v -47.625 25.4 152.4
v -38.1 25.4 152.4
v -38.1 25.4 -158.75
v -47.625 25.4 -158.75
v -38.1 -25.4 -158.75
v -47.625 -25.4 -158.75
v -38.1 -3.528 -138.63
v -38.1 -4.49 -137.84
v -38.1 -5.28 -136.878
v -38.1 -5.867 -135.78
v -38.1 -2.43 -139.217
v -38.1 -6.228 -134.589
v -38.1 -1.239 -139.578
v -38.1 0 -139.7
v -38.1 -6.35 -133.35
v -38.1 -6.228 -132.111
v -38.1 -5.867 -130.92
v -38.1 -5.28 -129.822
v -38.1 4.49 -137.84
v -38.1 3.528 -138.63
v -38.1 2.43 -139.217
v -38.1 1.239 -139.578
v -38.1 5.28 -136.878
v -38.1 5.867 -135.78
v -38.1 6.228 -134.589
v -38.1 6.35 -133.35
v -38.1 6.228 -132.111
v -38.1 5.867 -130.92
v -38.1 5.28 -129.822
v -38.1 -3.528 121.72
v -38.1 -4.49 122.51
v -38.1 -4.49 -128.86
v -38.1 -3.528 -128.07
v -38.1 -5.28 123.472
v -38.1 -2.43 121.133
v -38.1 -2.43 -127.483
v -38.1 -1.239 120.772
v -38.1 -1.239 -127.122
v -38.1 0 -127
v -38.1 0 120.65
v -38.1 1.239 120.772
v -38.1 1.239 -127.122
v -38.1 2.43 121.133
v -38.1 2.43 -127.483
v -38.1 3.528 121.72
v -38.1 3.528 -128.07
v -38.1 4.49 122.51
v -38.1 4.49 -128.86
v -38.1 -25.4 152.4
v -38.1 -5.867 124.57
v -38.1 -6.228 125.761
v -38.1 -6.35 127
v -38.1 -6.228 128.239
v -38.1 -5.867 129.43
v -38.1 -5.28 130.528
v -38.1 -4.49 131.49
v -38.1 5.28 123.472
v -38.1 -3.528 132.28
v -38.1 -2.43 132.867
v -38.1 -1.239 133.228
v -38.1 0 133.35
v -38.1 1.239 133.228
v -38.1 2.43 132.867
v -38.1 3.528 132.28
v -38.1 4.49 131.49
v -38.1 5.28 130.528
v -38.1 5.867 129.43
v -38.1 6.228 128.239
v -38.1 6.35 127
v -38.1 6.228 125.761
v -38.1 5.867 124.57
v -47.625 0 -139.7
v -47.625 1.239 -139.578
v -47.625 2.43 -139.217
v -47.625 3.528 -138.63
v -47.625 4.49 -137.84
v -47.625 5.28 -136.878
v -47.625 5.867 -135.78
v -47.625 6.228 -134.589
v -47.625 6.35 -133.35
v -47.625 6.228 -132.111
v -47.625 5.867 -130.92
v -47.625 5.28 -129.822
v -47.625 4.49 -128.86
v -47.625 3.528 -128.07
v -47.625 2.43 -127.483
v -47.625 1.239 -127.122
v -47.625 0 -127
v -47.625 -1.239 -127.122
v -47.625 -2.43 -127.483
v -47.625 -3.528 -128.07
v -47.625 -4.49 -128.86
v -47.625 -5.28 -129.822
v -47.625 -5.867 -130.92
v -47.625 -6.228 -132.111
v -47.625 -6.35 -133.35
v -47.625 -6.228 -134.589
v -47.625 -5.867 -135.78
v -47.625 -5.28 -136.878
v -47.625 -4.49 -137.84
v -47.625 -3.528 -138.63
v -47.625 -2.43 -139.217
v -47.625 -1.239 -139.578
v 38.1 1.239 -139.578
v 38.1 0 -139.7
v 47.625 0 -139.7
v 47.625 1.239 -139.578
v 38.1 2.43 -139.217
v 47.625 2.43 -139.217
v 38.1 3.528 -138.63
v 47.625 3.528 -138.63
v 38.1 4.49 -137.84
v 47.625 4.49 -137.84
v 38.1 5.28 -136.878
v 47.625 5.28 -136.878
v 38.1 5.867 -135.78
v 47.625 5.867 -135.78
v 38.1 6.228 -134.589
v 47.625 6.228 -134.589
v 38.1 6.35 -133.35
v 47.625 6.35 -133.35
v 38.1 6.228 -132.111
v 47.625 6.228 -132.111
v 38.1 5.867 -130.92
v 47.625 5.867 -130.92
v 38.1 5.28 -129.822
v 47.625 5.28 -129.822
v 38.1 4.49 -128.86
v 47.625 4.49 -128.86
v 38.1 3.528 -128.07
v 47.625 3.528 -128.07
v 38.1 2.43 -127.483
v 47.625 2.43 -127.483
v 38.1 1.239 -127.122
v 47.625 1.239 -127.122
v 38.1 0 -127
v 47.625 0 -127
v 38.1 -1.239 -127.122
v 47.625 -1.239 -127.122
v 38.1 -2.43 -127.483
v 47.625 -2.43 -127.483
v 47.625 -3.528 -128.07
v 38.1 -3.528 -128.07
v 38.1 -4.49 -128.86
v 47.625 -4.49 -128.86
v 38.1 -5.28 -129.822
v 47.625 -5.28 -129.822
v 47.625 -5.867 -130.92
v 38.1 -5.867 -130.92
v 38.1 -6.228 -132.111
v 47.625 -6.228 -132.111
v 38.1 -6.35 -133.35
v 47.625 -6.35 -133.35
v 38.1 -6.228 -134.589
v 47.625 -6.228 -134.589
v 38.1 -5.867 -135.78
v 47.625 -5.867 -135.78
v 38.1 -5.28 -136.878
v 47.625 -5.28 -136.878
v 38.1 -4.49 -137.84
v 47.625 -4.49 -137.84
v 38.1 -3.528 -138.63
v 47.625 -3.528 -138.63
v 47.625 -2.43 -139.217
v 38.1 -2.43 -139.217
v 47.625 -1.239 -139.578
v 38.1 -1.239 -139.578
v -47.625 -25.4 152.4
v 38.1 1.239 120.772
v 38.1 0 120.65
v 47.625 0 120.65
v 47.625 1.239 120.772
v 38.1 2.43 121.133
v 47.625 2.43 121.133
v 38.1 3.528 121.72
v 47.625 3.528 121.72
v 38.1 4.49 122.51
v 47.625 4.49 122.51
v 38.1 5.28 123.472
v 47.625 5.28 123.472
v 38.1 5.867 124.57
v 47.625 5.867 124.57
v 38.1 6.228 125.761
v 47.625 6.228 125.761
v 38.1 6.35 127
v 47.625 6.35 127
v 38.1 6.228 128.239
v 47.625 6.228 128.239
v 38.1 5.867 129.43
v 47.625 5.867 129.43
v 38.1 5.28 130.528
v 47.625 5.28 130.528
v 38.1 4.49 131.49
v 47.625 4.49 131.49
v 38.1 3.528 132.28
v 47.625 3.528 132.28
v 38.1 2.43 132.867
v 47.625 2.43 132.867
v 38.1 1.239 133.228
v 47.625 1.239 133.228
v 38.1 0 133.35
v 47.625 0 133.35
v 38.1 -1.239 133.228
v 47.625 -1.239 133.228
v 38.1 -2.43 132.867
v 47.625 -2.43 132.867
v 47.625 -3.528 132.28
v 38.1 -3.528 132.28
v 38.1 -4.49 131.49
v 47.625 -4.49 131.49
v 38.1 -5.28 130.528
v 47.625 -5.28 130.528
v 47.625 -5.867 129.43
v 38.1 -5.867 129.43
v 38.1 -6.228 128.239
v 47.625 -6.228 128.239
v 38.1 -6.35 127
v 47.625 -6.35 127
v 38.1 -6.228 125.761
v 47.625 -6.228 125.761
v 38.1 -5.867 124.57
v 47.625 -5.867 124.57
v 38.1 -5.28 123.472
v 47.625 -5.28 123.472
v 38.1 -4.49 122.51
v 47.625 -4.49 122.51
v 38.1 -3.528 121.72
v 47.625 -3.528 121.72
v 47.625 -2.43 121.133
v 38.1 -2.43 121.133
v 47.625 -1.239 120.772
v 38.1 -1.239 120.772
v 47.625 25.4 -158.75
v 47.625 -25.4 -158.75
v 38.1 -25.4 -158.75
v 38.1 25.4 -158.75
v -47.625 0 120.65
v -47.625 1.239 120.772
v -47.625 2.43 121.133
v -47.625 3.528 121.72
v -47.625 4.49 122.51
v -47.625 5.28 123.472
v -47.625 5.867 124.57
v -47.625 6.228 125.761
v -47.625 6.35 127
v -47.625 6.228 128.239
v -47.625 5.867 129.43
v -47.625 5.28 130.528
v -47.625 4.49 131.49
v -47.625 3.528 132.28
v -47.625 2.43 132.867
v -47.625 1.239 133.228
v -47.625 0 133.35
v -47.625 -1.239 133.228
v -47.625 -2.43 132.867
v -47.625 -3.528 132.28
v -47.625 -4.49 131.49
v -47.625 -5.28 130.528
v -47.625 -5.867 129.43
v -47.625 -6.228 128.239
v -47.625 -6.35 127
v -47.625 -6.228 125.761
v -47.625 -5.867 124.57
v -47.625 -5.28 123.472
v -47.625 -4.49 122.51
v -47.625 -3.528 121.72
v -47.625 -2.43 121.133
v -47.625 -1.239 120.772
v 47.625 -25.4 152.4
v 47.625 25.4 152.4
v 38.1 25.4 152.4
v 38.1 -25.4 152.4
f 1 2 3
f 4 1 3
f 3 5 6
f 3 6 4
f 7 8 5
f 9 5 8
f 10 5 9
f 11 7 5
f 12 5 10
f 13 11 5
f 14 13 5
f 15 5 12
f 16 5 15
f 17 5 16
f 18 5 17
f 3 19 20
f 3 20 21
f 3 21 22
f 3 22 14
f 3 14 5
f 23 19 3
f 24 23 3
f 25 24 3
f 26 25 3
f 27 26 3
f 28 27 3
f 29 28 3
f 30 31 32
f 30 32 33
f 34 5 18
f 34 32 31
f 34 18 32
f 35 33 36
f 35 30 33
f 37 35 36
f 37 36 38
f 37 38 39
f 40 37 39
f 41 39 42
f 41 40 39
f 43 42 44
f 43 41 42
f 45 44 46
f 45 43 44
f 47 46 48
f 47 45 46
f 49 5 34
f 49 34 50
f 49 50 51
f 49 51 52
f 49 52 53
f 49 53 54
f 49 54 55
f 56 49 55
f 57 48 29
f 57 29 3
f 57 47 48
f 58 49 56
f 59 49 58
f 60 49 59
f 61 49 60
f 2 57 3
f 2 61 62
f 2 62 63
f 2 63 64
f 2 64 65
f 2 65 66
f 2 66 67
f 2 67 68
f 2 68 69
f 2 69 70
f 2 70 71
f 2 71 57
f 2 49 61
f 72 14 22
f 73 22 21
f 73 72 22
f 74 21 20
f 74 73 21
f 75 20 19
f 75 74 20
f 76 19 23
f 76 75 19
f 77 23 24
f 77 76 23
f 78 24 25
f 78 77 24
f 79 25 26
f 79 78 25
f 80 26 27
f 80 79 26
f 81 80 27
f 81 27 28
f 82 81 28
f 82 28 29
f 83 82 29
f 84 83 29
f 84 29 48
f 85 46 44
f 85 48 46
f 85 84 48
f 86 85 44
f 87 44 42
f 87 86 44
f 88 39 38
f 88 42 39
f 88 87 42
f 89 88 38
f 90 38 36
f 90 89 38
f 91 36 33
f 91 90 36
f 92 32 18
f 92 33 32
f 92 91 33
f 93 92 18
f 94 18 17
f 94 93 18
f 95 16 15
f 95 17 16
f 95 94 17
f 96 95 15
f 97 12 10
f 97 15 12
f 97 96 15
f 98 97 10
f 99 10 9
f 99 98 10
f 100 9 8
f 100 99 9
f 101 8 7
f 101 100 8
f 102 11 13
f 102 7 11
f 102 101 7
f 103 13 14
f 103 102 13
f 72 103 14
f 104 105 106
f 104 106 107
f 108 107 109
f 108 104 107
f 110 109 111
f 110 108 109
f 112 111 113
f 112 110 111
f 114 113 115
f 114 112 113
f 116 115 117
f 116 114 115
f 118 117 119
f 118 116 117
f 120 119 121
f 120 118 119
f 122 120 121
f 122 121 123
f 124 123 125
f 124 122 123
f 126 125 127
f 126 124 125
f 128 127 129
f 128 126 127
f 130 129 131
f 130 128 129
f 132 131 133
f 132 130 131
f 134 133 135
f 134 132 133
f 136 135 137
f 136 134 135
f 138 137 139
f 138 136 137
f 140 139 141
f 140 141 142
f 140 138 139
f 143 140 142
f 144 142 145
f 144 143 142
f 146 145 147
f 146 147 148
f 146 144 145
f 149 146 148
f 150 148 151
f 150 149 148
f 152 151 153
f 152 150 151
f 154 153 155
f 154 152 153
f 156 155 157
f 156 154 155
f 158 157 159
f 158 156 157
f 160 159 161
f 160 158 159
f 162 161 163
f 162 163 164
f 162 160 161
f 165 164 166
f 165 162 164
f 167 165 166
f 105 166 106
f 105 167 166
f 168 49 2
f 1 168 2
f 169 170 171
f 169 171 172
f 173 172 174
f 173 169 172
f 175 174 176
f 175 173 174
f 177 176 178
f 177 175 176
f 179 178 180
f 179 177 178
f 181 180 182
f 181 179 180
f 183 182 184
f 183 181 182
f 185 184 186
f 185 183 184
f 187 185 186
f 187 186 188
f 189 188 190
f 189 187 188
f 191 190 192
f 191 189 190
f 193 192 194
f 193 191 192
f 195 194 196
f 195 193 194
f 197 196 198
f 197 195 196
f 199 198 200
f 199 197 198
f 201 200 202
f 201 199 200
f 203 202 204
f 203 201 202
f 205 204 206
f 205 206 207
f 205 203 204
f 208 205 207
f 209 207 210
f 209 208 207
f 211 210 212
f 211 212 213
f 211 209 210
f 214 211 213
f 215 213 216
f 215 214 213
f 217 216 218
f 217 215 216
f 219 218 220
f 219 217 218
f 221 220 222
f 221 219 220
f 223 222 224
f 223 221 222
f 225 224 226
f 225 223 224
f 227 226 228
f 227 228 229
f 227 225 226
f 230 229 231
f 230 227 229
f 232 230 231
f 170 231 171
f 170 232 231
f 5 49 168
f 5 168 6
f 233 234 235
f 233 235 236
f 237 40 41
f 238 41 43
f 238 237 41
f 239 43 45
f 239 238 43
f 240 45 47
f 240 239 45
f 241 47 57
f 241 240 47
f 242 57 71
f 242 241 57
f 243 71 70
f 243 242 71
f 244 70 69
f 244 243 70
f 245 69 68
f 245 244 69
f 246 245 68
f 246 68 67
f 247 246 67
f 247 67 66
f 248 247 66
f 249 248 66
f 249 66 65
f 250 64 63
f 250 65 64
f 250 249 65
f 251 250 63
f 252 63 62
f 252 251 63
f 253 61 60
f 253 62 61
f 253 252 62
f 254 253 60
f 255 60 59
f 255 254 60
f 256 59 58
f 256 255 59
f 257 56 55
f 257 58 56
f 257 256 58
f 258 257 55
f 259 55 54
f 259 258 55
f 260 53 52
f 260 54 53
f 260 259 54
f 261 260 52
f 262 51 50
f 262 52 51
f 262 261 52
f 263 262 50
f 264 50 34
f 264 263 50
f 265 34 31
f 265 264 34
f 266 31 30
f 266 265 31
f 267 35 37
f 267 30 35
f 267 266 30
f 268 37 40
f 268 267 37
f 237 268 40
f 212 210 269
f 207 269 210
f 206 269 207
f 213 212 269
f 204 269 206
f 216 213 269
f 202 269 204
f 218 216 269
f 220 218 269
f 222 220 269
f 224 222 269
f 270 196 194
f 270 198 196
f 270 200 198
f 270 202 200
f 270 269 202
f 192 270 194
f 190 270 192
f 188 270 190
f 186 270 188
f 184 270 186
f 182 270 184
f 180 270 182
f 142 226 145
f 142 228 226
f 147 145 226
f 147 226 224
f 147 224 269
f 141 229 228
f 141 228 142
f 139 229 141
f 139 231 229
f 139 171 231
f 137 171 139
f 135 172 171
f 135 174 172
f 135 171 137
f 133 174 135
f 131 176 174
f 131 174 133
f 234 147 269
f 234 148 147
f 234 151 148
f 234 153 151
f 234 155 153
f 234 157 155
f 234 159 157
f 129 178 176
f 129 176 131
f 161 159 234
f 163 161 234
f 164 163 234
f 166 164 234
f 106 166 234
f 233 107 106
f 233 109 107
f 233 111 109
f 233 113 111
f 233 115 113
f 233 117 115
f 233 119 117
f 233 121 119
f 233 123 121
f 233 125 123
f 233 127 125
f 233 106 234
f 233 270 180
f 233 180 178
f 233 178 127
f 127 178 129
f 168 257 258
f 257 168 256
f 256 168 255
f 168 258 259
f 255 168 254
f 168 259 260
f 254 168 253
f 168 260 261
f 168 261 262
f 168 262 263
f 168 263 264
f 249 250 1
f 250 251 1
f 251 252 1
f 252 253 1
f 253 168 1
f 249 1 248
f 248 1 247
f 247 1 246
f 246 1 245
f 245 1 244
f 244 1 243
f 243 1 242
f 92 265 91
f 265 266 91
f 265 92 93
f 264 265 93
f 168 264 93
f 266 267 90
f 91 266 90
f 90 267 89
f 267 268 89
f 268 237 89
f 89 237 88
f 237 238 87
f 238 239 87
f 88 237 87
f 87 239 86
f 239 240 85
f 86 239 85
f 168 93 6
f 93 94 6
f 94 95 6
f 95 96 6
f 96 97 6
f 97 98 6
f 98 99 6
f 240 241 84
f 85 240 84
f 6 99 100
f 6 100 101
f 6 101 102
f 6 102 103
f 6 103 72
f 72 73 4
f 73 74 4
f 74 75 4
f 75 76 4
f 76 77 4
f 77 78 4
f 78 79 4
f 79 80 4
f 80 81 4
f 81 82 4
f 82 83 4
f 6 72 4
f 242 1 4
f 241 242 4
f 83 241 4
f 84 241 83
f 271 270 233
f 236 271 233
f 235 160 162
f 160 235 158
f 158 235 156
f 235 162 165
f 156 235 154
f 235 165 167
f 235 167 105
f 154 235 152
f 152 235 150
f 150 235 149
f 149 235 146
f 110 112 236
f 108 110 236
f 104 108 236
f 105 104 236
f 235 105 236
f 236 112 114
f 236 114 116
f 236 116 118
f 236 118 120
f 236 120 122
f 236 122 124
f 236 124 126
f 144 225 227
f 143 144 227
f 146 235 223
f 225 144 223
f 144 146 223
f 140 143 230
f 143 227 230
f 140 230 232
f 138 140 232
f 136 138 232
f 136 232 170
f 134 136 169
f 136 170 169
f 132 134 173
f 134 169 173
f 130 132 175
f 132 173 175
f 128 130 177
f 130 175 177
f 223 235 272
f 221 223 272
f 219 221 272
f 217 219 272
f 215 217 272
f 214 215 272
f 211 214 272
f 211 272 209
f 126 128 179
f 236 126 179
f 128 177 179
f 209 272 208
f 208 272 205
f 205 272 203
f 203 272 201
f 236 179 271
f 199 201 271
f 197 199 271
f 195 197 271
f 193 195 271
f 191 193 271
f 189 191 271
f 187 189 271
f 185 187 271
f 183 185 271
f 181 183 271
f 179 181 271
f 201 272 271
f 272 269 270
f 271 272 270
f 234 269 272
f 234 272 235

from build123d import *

# Parameters (mm, degrees)
SKETCH1_W           = 311.15
SKETCH1_H           = 50.8
SKETCH1_R           = 6.35
BOSS_EXTRUDE1_DEPTH = 47.625
SKETCH2_W           = 76.2
SKETCH2_H           = 50.8
CUT_EXTRUDE1_DEPTH  = 311.15


with BuildPart() as part:
    # Sketch1 → Boss-Extrude1 (new body, symmetric)
    with BuildSketch(Plane(origin=(0, 0, 0), x_dir=(0, 0, -1), z_dir=(1, 0, 0))):
        with Locations((3.175, 0)):
            Rectangle(SKETCH1_W, SKETCH1_H)
        with Locations((-127, 0)):
            Circle(SKETCH1_R, mode=Mode.SUBTRACT)
        with Locations((133.35, 0)):
            Circle(SKETCH1_R, mode=Mode.SUBTRACT)
    extrude(amount=BOSS_EXTRUDE1_DEPTH, both=True)

    # Sketch2 → Cut-Extrude1 (cut)
    with BuildSketch(Plane.XY.offset(152.4)):
        Rectangle(SKETCH2_W, SKETCH2_H)
    extrude(amount=-CUT_EXTRUDE1_DEPTH, mode=Mode.SUBTRACT)


solid = part.part
